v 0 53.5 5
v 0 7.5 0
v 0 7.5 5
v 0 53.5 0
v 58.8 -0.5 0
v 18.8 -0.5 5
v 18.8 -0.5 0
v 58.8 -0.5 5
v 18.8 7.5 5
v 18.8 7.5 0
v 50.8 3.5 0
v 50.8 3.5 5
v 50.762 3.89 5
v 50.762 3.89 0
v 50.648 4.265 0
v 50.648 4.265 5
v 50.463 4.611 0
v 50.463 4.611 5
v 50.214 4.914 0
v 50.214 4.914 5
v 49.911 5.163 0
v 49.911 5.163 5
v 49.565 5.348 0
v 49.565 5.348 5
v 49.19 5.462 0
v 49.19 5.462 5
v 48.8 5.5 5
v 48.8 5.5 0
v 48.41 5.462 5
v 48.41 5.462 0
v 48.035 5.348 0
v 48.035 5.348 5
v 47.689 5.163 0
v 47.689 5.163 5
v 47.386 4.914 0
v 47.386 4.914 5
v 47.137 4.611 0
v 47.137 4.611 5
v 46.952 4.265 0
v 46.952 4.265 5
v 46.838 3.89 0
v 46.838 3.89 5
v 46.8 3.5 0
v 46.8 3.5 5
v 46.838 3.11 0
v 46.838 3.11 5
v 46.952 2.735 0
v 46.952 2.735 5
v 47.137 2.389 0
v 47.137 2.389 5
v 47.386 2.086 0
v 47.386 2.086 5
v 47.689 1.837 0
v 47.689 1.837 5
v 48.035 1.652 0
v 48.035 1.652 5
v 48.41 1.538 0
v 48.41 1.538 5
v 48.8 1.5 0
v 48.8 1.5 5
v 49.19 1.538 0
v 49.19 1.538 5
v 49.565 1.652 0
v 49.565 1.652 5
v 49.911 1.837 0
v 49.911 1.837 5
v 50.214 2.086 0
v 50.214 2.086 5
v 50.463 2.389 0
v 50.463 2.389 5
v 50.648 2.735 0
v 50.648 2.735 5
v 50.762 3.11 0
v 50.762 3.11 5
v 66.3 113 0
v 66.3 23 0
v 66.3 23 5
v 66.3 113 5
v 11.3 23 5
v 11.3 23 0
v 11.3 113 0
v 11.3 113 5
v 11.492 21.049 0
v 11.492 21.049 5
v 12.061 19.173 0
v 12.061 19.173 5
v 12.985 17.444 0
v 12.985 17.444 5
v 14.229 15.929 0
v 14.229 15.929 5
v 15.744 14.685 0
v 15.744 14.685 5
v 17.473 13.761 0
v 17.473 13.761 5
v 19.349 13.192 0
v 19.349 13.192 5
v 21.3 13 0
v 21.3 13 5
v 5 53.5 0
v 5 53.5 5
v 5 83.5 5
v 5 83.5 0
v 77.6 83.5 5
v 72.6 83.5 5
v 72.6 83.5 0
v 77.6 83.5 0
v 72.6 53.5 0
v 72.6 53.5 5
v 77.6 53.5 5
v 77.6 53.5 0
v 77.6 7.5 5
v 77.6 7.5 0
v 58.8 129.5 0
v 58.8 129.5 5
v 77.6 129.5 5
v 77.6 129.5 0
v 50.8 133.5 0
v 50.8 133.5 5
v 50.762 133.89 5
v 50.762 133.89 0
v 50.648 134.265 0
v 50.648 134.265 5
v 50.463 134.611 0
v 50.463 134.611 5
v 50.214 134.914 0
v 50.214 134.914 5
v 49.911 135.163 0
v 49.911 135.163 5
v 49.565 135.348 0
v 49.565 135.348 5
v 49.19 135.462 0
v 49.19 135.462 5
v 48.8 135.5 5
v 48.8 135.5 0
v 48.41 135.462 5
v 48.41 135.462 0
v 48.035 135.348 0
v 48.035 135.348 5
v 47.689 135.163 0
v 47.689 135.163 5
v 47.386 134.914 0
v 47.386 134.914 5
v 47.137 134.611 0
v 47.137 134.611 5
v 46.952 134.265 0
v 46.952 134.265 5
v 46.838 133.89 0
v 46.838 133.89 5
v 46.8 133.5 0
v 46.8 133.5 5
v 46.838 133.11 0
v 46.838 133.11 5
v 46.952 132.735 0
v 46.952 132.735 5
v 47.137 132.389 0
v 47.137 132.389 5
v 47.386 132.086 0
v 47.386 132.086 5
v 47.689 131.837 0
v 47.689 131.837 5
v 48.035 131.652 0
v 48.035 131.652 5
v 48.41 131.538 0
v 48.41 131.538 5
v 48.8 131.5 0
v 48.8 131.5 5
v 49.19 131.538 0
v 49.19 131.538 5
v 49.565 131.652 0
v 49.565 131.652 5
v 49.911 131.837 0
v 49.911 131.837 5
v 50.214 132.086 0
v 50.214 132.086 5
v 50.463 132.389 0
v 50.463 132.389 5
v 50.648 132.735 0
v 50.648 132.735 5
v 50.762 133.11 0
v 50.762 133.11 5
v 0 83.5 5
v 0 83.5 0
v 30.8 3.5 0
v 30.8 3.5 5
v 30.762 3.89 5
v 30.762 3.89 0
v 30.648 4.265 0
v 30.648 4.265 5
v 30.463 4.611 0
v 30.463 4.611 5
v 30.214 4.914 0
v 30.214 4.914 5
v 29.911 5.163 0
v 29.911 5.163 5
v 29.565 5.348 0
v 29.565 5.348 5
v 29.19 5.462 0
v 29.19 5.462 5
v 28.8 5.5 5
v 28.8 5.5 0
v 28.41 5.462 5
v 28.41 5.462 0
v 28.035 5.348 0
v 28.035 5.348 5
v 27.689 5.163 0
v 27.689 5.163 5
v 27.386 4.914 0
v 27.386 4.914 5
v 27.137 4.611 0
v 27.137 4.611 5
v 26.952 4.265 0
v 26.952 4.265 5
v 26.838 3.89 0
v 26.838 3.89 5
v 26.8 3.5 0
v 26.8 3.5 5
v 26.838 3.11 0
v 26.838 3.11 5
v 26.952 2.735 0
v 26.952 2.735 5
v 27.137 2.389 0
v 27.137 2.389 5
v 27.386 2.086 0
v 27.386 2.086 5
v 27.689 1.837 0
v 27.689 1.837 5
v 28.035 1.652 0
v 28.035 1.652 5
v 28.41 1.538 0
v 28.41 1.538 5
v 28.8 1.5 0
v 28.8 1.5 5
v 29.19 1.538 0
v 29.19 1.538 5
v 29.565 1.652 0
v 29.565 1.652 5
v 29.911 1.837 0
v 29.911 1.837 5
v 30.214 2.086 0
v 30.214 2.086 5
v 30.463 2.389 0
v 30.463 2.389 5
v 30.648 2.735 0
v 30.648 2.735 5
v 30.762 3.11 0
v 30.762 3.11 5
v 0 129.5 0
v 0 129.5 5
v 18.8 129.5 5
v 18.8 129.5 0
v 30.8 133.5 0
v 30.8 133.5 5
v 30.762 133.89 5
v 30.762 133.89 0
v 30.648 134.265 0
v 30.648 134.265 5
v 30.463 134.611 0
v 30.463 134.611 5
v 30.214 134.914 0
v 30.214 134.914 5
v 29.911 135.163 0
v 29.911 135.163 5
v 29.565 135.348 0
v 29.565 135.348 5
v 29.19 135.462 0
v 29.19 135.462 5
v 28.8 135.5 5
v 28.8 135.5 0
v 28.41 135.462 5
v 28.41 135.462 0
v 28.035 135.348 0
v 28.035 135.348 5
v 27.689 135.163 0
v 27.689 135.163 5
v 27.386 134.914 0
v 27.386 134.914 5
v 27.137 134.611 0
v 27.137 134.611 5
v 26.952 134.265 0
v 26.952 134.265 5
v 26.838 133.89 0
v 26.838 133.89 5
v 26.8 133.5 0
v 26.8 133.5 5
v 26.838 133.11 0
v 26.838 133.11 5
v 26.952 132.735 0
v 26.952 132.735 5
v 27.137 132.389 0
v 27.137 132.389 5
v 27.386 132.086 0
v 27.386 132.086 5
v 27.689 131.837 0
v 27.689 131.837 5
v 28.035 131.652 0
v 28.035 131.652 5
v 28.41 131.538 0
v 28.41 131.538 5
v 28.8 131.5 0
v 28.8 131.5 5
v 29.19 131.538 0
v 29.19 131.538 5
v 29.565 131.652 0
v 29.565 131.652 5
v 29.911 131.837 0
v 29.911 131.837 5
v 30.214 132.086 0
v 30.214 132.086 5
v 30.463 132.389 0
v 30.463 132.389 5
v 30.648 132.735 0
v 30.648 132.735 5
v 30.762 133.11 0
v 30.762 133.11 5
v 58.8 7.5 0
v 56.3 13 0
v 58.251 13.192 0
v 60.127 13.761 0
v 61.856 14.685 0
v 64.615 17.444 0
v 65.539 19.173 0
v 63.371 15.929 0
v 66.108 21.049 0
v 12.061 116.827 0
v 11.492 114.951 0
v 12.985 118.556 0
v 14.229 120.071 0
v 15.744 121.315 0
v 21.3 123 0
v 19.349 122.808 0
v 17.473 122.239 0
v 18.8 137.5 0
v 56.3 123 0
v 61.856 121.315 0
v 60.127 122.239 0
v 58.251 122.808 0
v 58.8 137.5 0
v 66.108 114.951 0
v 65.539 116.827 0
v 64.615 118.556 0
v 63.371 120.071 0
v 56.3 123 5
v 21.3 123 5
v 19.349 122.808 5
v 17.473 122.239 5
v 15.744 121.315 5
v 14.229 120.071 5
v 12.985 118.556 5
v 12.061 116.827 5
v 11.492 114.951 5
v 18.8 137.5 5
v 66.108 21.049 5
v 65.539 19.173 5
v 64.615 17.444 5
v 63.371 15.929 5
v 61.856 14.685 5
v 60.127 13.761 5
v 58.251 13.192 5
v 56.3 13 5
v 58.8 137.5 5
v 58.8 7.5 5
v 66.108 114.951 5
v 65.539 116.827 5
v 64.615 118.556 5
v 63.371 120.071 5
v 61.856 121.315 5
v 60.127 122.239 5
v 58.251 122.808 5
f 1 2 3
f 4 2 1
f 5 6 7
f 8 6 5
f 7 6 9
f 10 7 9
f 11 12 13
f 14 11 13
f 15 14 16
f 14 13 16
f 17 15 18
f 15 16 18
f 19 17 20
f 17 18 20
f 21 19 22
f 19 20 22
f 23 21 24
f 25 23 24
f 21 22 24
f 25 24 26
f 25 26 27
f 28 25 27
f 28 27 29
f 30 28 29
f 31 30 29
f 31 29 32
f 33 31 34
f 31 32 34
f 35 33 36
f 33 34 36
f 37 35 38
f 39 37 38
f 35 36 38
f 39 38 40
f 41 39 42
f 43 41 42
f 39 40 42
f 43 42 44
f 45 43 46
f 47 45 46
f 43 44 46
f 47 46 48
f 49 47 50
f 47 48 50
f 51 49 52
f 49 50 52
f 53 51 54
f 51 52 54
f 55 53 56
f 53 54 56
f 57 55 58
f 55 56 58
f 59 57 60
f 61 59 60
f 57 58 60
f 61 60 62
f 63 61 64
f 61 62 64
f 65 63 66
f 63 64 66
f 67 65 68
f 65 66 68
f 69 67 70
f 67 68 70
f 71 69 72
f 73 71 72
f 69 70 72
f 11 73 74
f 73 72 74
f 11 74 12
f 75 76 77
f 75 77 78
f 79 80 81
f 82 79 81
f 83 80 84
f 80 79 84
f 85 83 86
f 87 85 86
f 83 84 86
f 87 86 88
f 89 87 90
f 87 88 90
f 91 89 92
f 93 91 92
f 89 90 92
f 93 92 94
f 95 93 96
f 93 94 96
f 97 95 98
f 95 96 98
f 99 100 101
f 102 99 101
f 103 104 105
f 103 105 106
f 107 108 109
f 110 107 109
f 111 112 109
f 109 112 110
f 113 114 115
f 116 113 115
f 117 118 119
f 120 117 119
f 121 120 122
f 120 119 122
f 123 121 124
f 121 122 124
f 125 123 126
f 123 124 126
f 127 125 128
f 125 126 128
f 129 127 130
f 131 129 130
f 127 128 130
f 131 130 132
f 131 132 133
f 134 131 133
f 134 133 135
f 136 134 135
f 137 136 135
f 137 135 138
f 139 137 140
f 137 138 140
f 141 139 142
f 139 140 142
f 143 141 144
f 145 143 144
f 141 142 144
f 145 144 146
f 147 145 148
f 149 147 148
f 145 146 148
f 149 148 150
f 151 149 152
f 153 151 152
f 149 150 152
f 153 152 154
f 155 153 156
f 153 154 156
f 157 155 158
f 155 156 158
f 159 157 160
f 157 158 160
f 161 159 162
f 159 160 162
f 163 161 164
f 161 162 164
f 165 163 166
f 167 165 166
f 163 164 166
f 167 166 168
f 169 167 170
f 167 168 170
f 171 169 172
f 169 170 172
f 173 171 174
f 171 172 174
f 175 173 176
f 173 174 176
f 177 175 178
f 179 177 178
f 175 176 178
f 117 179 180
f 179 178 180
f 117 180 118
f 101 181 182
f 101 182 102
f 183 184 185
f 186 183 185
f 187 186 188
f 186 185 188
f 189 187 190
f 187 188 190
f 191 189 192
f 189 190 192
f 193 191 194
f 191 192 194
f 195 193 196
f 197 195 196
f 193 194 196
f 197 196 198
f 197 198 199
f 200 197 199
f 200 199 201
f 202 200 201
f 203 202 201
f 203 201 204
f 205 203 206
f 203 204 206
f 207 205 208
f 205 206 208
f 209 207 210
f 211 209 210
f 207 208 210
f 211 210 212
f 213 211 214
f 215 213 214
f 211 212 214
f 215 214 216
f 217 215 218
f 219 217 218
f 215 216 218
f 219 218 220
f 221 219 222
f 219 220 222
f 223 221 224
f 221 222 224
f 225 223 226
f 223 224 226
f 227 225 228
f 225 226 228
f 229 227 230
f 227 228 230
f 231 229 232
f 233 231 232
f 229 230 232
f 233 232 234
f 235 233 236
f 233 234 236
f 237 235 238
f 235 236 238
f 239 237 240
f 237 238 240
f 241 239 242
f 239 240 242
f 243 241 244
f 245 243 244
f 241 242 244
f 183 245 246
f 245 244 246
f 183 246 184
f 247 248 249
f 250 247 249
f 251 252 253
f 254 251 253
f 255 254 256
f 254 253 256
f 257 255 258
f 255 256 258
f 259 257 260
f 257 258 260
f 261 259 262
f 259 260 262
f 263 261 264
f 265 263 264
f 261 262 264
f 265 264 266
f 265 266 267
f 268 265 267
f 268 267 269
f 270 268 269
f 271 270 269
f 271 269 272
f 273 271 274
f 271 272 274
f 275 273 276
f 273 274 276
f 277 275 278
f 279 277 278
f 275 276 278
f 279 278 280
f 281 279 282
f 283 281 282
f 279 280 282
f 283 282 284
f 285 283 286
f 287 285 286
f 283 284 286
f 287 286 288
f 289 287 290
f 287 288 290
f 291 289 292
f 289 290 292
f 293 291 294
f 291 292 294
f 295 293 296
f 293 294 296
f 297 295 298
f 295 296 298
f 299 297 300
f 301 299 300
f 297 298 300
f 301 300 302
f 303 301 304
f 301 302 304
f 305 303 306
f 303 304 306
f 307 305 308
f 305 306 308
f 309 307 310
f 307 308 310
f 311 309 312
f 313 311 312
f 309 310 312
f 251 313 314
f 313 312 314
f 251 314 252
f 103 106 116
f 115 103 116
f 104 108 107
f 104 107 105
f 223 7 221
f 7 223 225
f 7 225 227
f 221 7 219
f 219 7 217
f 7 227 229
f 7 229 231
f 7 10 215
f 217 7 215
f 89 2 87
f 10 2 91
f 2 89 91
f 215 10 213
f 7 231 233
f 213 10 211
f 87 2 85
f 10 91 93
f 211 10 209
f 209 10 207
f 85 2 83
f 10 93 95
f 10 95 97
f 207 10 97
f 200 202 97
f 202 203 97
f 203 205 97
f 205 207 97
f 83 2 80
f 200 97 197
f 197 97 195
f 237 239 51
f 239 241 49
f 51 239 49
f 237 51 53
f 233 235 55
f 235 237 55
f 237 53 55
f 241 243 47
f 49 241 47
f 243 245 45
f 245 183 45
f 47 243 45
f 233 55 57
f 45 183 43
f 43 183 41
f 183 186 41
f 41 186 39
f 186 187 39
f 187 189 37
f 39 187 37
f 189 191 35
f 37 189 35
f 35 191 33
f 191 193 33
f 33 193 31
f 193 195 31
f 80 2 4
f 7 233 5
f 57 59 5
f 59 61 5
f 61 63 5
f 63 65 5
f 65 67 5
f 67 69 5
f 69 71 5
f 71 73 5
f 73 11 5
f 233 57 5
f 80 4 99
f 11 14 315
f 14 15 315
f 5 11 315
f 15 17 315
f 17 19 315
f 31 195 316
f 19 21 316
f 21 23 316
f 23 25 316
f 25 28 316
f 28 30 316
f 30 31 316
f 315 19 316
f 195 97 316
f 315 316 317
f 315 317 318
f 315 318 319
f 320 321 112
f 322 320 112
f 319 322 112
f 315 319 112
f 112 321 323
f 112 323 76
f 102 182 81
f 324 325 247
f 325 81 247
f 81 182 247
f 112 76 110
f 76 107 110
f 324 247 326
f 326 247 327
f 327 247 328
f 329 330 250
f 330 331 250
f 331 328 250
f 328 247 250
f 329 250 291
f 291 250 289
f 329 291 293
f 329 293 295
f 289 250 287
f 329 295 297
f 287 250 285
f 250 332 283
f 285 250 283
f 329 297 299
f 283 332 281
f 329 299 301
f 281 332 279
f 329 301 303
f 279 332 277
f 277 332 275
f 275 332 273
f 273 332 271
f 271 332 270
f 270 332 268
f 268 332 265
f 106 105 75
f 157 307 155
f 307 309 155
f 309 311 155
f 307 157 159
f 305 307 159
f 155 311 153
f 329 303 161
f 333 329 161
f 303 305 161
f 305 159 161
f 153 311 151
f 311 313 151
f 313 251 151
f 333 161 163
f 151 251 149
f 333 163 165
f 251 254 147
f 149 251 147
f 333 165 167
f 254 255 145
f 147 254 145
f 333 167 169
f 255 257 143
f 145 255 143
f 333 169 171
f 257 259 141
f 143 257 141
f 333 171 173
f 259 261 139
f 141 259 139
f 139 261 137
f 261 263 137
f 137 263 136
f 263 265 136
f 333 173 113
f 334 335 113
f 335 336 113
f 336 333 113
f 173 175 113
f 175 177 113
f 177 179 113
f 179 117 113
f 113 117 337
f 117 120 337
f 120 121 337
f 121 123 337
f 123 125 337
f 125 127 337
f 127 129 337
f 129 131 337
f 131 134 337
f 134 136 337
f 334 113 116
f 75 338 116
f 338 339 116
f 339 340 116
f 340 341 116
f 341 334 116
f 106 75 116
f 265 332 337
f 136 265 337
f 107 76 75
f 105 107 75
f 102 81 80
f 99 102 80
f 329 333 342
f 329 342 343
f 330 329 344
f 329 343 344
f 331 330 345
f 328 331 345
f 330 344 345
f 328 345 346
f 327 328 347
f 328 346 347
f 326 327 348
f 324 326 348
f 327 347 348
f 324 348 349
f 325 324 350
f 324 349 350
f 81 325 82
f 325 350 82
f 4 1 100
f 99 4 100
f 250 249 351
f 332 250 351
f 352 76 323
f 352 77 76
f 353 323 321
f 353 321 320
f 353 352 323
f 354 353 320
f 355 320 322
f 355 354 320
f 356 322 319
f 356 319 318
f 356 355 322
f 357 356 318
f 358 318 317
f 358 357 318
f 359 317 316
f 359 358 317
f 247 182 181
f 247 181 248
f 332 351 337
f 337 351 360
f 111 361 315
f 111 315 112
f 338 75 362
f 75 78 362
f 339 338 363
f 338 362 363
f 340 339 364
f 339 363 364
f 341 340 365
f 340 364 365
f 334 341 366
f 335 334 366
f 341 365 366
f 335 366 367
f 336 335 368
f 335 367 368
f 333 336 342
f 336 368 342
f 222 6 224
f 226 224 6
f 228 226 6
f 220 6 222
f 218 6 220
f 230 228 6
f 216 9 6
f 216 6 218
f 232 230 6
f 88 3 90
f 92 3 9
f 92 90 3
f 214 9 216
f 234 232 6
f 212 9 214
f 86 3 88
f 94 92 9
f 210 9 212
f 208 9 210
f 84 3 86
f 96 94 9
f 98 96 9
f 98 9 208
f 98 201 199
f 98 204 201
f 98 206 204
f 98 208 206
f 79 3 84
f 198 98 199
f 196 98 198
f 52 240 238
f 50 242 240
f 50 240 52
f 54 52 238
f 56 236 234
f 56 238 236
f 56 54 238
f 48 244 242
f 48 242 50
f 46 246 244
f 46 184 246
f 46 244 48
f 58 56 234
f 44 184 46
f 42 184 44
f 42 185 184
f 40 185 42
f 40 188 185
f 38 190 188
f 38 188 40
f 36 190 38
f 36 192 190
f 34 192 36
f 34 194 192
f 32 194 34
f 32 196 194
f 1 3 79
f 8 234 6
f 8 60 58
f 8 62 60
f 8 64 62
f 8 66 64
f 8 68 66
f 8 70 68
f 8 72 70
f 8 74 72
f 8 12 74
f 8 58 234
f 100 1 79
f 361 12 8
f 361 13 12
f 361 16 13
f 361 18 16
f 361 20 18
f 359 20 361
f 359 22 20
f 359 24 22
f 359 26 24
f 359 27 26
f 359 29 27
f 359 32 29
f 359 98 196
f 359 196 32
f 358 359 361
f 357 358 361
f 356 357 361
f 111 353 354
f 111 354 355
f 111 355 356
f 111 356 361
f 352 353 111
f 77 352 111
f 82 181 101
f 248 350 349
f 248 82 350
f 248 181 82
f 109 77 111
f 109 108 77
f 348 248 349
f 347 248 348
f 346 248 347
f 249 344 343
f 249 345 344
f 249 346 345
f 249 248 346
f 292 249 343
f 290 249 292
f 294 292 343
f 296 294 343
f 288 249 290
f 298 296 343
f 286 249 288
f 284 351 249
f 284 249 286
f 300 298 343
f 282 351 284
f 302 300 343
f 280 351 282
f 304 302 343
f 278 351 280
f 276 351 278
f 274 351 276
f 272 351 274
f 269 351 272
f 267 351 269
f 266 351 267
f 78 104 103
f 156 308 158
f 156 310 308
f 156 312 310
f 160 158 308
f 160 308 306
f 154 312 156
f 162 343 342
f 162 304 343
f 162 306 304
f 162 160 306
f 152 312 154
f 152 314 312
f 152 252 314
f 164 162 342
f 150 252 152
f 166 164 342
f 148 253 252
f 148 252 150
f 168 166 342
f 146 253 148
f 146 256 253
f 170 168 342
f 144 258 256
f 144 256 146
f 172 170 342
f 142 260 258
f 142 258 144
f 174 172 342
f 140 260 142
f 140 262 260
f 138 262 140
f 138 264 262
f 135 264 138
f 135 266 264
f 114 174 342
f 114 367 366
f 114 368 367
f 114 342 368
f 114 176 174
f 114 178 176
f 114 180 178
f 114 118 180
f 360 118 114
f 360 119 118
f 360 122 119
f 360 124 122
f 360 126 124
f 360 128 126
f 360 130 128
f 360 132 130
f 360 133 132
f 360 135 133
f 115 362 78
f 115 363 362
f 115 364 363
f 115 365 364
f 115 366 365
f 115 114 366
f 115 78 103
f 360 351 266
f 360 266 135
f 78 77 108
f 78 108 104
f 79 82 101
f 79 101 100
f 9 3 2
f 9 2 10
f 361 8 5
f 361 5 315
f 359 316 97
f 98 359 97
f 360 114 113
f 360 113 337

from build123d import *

# Parameters (mm, degrees)
SKETCH_1_W          = 77.6
SKETCH_1_H          = 137
EXTRUDE_1_DEPTH     = 5
SKETCH_3_W          = 18.8
SKETCH_3_H          = 7.5
SKETCH_3_W_2        = 5
SKETCH_3_H_2        = 30
CUT_EXTRUDE_1_DEPTH = 5
SKETCH_4_R          = 2
CUT_EXTRUDE_2_DEPTH = 5
SKETCH_5_W          = 55
SKETCH_5_H          = 110
CUT_EXTRUDE_3_DEPTH = 7
FILLET_1_R          = 10
SKETCH_7_W          = 40
SKETCH_7_H          = 0.5
EXTRUDE_2_DEPTH     = 5


with BuildPart() as part:
    # 草图1 → 凸台-拉伸1 (new body)
    with BuildSketch(Plane.XY):
        with Locations((38.8, 68.5)):
            Rectangle(SKETCH_1_W, SKETCH_1_H)
    extrude(amount=EXTRUDE_1_DEPTH)

    # 草图3 → 切除-拉伸1 (cut)
    with BuildSketch(Plane.XY.offset(5)):
        with Locations((9.4, 133.25)):
            Rectangle(SKETCH_3_W, SKETCH_3_H)
        with Locations((9.4, 3.75)):
            Rectangle(SKETCH_3_W, SKETCH_3_H)
        with Locations((68.2, 3.75)):
            Rectangle(SKETCH_3_W, SKETCH_3_H)
        with Locations((68.2, 133.25)):
            Rectangle(SKETCH_3_W, SKETCH_3_H)
        with Locations((75.1, 68.5)):
            Rectangle(SKETCH_3_W_2, SKETCH_3_H_2)
        with Locations((2.5, 68.5)):
            Rectangle(SKETCH_3_W_2, SKETCH_3_H_2)
    extrude(amount=-CUT_EXTRUDE_1_DEPTH, mode=Mode.SUBTRACT)

    # 草图4 → 切除-拉伸2 (cut)
    with BuildSketch(Plane.XY.offset(5)):
        with Locations((28.8, 133.5)):
            Circle(SKETCH_4_R)
        with Locations((48.8, 133.5)):
            Circle(SKETCH_4_R)
        with Locations((28.8, 3.5)):
            Circle(SKETCH_4_R)
        with Locations((48.8, 3.5)):
            Circle(SKETCH_4_R)
    extrude(amount=-CUT_EXTRUDE_2_DEPTH, mode=Mode.SUBTRACT)

    # 草图5 → 切除-拉伸3 (cut)
    with BuildSketch(Plane(origin=(0, 0, 0), x_dir=(-1, 0, 0), z_dir=(0, 0, -1))):
        with Locations((-38.8, 68)):
            Rectangle(SKETCH_5_W, SKETCH_5_H)
    extrude(amount=-CUT_EXTRUDE_3_DEPTH, mode=Mode.SUBTRACT)

    # 圆角1
    fillet_1_edges = [part.edges().sort_by_distance(p)[0] for p in [
        (66.3, 13, 2.5),
        (66.3, 123, 2.5),
        (11.3, 123, 2.5),
        (11.3, 13, 2.5),
    ]]
    fillet(fillet_1_edges, radius=FILLET_1_R)

    # 草图7 → 凸台-拉伸2 (add)
    with BuildSketch(Plane.XY.offset(5)):
        with Locations((38.8, 137.25)):
            Rectangle(SKETCH_7_W, SKETCH_7_H)
        with Locations((38.8, -0.25)):
            Rectangle(SKETCH_7_W, SKETCH_7_H)
    extrude(amount=-EXTRUDE_2_DEPTH)


solid = part.part
